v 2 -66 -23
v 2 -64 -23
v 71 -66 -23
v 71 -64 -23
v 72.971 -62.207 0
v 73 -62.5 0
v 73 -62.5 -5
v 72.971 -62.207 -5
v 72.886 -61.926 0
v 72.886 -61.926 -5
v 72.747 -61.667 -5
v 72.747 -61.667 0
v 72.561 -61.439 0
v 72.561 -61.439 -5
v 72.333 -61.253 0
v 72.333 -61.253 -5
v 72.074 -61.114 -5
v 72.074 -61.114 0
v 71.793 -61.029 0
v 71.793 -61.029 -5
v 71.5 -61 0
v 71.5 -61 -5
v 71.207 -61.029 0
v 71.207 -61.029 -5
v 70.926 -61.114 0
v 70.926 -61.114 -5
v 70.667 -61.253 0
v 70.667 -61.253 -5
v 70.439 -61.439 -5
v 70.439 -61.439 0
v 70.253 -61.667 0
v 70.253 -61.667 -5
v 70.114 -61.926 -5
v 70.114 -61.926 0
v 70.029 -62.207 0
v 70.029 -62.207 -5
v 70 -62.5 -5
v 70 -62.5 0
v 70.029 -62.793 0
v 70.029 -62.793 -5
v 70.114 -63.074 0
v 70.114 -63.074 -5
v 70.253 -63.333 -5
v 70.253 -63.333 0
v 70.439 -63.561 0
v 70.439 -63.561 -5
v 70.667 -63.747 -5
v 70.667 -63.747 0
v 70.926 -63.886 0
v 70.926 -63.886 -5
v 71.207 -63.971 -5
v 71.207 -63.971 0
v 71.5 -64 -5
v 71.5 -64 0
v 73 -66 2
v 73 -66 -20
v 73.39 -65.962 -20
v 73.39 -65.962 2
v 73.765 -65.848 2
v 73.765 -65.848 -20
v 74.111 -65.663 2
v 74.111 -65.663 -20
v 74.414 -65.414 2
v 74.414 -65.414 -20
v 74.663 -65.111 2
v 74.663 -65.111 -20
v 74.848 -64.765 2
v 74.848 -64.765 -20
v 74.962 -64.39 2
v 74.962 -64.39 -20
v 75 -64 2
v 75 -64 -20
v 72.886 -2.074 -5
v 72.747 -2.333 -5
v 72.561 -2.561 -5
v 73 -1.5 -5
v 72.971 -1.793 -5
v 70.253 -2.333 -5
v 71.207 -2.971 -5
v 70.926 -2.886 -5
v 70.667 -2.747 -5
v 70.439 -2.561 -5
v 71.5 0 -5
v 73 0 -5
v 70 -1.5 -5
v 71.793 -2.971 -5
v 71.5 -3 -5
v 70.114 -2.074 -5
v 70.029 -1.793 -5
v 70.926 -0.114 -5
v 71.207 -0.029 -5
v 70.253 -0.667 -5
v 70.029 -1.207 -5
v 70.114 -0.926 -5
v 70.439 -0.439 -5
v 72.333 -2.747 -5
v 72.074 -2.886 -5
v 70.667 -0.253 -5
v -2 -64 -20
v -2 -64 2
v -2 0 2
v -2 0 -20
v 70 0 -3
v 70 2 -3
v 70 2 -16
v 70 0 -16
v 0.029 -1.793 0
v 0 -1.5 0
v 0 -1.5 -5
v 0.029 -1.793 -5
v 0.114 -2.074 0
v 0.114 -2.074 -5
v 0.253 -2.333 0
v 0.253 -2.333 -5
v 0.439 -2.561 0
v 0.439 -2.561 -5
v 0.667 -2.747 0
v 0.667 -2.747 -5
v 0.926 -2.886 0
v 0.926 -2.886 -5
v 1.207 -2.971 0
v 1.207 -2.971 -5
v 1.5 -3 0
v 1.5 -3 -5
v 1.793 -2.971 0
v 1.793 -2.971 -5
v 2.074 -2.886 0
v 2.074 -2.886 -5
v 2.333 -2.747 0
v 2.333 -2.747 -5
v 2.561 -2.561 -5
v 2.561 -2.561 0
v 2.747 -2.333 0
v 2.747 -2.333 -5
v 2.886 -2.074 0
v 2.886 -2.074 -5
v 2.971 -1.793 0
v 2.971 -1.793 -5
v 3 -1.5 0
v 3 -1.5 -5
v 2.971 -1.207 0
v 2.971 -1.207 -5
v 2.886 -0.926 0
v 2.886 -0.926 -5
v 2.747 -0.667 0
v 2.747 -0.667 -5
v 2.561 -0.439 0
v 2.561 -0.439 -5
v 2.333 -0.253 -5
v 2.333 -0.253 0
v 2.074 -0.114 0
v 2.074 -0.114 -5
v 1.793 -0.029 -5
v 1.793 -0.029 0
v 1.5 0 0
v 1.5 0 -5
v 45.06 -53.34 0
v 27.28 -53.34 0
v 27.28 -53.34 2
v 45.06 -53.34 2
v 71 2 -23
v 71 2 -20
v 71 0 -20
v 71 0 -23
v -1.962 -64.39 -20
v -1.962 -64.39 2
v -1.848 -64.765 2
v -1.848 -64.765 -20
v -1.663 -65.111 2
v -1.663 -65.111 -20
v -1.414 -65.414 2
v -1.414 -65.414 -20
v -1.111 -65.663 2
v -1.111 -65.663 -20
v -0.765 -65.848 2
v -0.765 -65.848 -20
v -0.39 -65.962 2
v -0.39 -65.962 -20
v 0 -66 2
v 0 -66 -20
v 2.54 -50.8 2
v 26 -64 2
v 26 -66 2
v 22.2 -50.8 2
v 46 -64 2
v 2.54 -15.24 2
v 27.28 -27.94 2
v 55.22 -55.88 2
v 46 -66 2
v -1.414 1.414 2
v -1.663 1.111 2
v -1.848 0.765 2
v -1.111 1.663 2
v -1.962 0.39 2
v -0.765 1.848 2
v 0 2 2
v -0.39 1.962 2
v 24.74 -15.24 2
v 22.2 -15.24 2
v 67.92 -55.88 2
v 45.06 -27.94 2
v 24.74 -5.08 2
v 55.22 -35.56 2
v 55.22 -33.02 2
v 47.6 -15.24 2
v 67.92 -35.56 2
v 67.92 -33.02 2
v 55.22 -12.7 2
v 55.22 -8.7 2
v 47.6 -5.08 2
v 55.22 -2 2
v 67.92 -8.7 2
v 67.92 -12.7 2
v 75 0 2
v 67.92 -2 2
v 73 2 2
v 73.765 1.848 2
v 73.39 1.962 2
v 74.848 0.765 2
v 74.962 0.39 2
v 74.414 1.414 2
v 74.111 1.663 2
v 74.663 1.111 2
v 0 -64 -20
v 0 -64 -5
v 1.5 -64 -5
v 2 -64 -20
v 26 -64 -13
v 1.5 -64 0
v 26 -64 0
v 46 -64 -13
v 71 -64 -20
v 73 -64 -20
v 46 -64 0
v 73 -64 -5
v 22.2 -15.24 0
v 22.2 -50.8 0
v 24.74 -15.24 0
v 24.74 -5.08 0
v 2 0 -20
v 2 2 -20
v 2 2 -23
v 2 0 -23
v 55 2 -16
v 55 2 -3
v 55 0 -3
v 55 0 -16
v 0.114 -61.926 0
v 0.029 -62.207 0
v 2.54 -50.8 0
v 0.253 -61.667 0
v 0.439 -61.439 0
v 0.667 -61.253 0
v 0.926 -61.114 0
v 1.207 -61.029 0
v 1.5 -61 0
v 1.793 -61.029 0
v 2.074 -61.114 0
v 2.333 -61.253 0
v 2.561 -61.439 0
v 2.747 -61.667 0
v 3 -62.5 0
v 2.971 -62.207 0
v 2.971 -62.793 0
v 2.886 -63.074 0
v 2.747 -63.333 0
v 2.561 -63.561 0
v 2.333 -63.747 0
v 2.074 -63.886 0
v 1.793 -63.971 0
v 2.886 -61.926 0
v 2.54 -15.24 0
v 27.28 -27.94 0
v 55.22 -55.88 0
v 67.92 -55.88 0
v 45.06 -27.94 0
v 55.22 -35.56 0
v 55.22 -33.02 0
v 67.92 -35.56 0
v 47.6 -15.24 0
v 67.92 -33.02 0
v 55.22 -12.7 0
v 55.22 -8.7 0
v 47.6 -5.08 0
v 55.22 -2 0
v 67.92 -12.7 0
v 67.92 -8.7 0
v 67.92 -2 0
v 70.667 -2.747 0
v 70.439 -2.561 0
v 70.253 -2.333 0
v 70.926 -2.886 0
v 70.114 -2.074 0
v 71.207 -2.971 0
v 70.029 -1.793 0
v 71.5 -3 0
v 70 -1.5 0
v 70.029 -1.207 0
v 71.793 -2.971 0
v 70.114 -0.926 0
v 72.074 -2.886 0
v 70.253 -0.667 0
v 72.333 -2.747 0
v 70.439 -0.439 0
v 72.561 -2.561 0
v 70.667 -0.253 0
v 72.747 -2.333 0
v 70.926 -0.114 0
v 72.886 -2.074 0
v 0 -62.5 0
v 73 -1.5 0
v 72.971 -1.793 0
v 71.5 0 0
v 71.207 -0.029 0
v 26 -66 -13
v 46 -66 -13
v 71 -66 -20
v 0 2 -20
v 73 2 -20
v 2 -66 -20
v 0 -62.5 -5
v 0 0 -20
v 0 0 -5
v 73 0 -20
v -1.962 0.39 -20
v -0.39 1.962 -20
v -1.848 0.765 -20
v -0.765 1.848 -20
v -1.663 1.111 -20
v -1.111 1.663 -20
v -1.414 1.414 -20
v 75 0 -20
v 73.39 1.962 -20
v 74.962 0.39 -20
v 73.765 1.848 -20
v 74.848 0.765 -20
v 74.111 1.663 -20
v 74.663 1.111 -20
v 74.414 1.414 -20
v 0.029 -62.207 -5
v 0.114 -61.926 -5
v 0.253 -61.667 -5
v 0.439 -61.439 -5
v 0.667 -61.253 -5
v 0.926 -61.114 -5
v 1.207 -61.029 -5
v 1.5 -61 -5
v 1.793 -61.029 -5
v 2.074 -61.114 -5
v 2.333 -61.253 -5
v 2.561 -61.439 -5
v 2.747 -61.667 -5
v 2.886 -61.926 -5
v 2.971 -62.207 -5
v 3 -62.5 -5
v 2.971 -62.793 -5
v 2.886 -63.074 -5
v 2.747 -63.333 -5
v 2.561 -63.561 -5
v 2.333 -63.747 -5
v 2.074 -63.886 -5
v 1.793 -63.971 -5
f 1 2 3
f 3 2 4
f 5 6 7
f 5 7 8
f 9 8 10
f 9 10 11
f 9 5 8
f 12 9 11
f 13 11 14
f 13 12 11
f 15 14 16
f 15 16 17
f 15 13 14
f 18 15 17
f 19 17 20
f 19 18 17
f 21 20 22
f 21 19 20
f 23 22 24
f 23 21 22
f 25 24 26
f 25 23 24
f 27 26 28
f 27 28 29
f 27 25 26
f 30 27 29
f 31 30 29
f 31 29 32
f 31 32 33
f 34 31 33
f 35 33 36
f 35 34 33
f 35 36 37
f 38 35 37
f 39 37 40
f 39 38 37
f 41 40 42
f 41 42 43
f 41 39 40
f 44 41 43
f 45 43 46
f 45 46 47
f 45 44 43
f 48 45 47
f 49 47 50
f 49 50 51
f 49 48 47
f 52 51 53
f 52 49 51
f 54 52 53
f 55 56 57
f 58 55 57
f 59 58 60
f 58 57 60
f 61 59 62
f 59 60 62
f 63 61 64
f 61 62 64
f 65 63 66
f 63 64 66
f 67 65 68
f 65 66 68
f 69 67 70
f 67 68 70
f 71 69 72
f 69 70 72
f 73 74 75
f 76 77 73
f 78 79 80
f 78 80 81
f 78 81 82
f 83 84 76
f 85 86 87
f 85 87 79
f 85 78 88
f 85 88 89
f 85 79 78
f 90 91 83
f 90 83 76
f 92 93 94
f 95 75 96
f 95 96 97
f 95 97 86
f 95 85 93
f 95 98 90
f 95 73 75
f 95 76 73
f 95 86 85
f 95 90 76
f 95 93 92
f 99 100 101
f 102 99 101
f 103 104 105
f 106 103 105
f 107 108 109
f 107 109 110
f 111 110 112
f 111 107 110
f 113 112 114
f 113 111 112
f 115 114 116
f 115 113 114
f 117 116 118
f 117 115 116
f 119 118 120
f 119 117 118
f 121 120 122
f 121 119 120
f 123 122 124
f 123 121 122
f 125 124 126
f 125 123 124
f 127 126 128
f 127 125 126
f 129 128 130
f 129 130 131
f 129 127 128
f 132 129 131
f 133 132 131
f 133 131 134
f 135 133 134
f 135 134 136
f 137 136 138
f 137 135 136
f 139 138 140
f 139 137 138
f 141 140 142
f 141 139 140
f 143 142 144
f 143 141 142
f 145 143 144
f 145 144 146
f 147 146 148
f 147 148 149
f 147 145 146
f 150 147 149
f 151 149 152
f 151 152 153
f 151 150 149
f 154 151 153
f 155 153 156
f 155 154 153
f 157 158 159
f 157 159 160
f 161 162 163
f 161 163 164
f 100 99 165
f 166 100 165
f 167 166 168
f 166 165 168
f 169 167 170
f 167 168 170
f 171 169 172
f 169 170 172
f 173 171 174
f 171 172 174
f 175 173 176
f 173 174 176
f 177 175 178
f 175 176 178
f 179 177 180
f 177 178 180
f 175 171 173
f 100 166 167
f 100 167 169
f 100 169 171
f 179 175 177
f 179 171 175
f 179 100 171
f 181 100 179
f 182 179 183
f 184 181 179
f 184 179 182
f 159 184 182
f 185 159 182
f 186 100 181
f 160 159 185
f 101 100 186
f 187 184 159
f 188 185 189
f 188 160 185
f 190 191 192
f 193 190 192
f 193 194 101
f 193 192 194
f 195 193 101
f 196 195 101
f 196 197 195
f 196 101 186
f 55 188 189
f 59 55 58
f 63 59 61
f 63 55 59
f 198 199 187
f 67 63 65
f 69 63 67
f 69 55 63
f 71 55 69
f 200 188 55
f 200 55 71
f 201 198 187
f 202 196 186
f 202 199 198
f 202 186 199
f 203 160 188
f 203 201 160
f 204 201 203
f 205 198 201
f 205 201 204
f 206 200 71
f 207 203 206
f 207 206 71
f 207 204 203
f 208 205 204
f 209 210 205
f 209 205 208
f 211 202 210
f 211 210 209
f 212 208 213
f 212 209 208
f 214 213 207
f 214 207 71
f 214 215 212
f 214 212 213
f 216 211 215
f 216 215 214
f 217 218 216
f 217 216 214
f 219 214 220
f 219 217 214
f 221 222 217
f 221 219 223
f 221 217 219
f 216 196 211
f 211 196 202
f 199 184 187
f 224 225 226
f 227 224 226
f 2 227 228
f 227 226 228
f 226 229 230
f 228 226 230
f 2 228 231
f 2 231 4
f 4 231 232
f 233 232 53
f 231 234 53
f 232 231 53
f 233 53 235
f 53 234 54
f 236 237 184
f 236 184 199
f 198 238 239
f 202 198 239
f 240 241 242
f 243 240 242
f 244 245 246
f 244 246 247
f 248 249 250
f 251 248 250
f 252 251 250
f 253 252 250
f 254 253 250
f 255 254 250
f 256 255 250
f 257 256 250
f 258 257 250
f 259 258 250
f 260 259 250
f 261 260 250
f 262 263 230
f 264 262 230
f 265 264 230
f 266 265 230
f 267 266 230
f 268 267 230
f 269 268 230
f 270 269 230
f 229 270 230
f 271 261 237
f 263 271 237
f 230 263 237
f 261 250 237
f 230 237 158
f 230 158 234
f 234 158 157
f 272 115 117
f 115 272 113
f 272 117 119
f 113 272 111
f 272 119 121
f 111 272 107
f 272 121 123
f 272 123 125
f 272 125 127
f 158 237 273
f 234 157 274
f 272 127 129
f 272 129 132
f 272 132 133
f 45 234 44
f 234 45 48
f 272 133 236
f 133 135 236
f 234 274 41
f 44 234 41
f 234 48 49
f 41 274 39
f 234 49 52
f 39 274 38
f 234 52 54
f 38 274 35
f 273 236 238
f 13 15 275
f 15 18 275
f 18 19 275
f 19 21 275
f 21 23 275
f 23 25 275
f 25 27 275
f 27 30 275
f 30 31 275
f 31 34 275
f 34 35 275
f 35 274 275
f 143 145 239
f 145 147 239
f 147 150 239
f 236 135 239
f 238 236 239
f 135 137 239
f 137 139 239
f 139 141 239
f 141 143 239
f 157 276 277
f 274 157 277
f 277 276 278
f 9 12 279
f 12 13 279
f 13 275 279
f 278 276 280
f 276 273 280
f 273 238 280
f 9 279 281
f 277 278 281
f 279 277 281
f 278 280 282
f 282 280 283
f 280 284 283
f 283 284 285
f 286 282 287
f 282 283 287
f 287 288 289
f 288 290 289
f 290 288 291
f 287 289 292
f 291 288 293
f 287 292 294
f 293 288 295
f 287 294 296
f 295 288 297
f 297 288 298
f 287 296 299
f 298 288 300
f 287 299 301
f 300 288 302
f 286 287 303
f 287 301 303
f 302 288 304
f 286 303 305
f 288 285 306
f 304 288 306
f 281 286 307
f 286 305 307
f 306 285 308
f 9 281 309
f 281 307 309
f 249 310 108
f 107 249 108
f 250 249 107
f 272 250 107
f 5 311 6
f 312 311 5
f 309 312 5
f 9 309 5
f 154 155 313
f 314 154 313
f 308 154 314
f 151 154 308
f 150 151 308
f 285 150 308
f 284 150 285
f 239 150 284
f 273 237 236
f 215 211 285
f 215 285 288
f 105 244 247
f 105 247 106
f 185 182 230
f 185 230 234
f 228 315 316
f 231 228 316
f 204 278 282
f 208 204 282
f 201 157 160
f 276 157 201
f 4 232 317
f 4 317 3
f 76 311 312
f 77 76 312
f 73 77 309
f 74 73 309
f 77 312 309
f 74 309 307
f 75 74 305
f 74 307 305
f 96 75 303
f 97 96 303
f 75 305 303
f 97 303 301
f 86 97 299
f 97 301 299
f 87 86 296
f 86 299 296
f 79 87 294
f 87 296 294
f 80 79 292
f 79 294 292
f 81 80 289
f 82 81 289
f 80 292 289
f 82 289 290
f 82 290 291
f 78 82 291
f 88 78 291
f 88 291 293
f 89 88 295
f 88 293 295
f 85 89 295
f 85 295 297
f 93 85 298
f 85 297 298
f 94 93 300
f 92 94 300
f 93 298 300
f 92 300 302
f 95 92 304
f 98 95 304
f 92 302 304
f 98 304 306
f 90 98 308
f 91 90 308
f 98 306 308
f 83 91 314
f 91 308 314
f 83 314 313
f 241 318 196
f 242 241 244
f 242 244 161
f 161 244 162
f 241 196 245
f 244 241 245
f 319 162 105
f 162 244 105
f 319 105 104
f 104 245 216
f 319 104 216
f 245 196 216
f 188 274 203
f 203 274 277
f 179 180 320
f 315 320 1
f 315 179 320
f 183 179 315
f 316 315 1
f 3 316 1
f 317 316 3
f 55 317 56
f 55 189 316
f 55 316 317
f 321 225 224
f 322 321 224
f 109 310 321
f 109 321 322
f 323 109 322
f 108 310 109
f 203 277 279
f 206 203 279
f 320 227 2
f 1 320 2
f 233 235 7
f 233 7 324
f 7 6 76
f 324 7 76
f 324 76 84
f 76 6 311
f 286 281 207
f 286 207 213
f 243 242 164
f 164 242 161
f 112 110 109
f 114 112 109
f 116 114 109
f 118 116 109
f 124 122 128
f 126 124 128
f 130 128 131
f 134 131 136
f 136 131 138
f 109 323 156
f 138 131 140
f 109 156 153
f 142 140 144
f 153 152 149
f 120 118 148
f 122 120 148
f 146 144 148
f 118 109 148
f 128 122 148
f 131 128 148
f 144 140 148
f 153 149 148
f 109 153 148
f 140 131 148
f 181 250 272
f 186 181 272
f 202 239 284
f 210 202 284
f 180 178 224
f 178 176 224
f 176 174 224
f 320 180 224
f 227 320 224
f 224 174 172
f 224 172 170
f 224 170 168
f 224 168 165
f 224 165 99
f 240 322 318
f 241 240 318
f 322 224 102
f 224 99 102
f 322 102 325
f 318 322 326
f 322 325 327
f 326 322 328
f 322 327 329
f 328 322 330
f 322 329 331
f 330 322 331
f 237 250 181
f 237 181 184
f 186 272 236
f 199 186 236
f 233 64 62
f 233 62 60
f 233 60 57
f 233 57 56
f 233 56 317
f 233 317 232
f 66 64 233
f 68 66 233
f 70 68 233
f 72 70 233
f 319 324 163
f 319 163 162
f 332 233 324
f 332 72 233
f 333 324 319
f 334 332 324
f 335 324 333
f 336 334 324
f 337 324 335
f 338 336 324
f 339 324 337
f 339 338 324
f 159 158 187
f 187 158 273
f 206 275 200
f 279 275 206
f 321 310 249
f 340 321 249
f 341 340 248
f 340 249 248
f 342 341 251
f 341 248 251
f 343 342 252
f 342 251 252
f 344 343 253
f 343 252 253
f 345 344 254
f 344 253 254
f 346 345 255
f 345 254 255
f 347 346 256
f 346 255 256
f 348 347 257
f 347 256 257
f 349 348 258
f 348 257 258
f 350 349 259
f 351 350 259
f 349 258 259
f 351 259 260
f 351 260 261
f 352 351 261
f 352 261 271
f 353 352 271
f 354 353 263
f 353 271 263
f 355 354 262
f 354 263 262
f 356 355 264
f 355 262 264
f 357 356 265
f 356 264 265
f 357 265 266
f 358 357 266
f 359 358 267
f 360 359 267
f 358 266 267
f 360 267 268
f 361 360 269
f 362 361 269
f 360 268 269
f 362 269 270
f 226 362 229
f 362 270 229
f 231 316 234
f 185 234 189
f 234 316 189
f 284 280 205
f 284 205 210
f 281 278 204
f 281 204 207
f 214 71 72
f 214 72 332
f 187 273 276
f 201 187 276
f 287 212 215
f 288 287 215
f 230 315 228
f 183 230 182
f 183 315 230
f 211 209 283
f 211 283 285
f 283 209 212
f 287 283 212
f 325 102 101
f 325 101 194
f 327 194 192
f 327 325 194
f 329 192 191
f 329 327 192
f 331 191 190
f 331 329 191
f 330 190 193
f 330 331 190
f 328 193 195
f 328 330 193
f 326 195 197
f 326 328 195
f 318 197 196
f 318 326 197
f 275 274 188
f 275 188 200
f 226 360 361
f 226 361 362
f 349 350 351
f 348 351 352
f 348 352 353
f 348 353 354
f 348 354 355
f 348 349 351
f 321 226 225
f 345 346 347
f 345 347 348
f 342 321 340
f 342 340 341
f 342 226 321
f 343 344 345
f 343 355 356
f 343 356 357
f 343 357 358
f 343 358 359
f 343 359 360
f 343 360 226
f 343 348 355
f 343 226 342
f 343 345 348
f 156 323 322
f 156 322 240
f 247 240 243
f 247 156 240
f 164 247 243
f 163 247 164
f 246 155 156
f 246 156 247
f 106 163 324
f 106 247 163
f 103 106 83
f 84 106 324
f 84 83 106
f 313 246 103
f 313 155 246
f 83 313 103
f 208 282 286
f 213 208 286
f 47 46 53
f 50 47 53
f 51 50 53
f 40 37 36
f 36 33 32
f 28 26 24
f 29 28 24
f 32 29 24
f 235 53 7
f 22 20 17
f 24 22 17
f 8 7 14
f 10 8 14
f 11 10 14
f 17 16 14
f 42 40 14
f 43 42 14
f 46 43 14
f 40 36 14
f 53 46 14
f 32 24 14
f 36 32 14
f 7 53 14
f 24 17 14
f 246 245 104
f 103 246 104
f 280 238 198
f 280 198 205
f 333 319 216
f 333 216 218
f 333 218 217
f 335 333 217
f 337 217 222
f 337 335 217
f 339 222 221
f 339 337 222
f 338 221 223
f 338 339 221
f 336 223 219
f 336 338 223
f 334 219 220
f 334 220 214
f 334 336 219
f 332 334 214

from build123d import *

# Parameters (mm, degrees)
SKETCH_1_W               = 73
SKETCH_1_H               = 64
SKETCH_1_W_2             = 22.86
SKETCH_1_H_2             = 10.16
SKETCH_1_W_3             = 12.7
SKETCH_1_H_3             = 20.32
SKETCH_1_W_4             = 19.66
SKETCH_1_H_4             = 35.56
SKETCH_1_W_5             = 17.78
SKETCH_1_H_5             = 25.4
EXTRUDE_1_DEPTH          = 2
SKETCH_2_W               = 77
SKETCH_2_H               = 68
SKETCH_2_W_2             = 73
SKETCH_2_H_2             = 64
EXTRUDE_2_DEPTH          = 25
FILLET_1_R               = 2
SKETCH_5_W               = 3
SKETCH_5_H               = 68
CUT_EXTRUDE_1_DEPTH      = 4
CUT_EXTRUDE_2_DEPTH      = 2
CUT_EXTRUDE_2_DEPTH_BACK = 2
SKETCH_7_W               = 3
SKETCH_7_H               = 68
SKETCH_8_W               = 20
SKETCH_8_H               = 15
CUT_EXTRUDE_3_DEPTH      = 2
SKETCH_9_W               = 15
SKETCH_9_H               = 13
CUT_EXTRUDE_4_DEPTH      = 2
SKETCH_10_W              = 12.7
SKETCH_10_H              = 6.7
CUT_EXTRUDE_5_DEPTH      = 2
EXTRUDE_3_DEPTH          = 5


with BuildPart() as part:
    # 草图1 → 凸台-拉伸1 (new body)
    with BuildSketch(Plane.XY):
        with Locations((36.5, -32)):
            Rectangle(SKETCH_1_W, SKETCH_1_H)
        with Locations((36.17, -10.16)):
            Rectangle(SKETCH_1_W_2, SKETCH_1_H_2, mode=Mode.SUBTRACT)
        with Locations((61.57, -22.86)):
            Rectangle(SKETCH_1_W_3, SKETCH_1_H_3, mode=Mode.SUBTRACT)
        with Locations((61.57, -45.72)):
            Rectangle(SKETCH_1_W_3, SKETCH_1_H_3, mode=Mode.SUBTRACT)
        with Locations((12.37, -33.02)):
            Rectangle(SKETCH_1_W_4, SKETCH_1_H_4, mode=Mode.SUBTRACT)
        with Locations((36.17, -40.64)):
            Rectangle(SKETCH_1_W_5, SKETCH_1_H_5, mode=Mode.SUBTRACT)
    extrude(amount=EXTRUDE_1_DEPTH)

    # 草图2 → 凸台-拉伸2 (add)
    with BuildSketch(Plane.XY.offset(2)):
        with Locations((36.5, -32)):
            Rectangle(SKETCH_2_W, SKETCH_2_H)
        with Locations((36.5, -32)):
            Rectangle(SKETCH_2_W_2, SKETCH_2_H_2, mode=Mode.SUBTRACT)
    extrude(amount=-EXTRUDE_2_DEPTH)

    # 圆角1
    fillet_1_edges = [part.edges().sort_by_distance(p)[0] for p in [
        (-2, 2, -10.5),
        (75, 2, -10.5),
        (75, -66, -10.5),
        (-2, -66, -10.5),
    ]]
    fillet(fillet_1_edges, radius=FILLET_1_R)

    # 草图5 → 切除-拉伸1 (cut)
    with BuildSketch(Plane(origin=(75, 0, 0), x_dir=(0, 0, -1), z_dir=(1, 0, 0))):
        with Locations((21.5, -32)):
            Rectangle(SKETCH_5_W, SKETCH_5_H)
    extrude(amount=-CUT_EXTRUDE_1_DEPTH, mode=Mode.SUBTRACT)

    # 草图7 → 切除-拉伸2 (cut, two sides: drawn at the far end of the back side and taken through both)
    with BuildSketch(Plane(origin=(0, 0, 0), x_dir=(0, 0, -1), z_dir=(1, 0, 0)).offset(-CUT_EXTRUDE_2_DEPTH_BACK)):
        with Locations((21.5, -32)):
            Rectangle(SKETCH_7_W, SKETCH_7_H)
    extrude(amount=CUT_EXTRUDE_2_DEPTH + CUT_EXTRUDE_2_DEPTH_BACK, mode=Mode.SUBTRACT)

    # 草图8 → 切除-拉伸3 (cut)
    with BuildSketch(Plane.XZ.offset(66)):
        with Locations((36, -5.5)):
            Rectangle(SKETCH_8_W, SKETCH_8_H)
    extrude(amount=-CUT_EXTRUDE_3_DEPTH, mode=Mode.SUBTRACT)

    # 草图9 → 切除-拉伸4 (cut)
    with BuildSketch(Plane(origin=(0, 2, 0), x_dir=(1, 0, 0), z_dir=(0, 1, 0))):
        with Locations((62.5, 9.5)):
            Rectangle(SKETCH_9_W, SKETCH_9_H)
    extrude(amount=-CUT_EXTRUDE_4_DEPTH, mode=Mode.SUBTRACT)

    # 草图10 → 切除-拉伸5 (cut)
    with BuildSketch(Plane.XY.offset(2)):
        with Locations((61.57, -5.35)):
            Rectangle(SKETCH_10_W, SKETCH_10_H)
    extrude(amount=-CUT_EXTRUDE_5_DEPTH, mode=Mode.SUBTRACT)

    # 草图12 → 凸台-拉伸3 (add)
    with BuildSketch(Plane(origin=(0, 0, 0), x_dir=(-1, 0, 0), z_dir=(0, 0, -1))):
        with BuildLine():
            Line((-1.5, -64), (0, -64))
            Line((0, -64), (0, -62.5))
            ThreePointArc((0, -62.5), (-2.560660172, -61.439339828), (-1.5, -64))
        make_face()
        with BuildLine():
            Line((-73, -64), (-73, -62.5))
            ThreePointArc((-73, -62.5), (-70.439339828, -61.439339828), (-71.5, -64))
            Line((-71.5, -64), (-73, -64))
        make_face()
        with BuildLine():
            Line((-71.5, 0), (-73, 0))
            Line((-73, 0), (-73, -1.5))
            ThreePointArc((-73, -1.5), (-70.439339828, -2.560660172), (-71.5, 0))
        make_face()
        with BuildLine():
            Line((0, 0), (0, -1.5))
            ThreePointArc((0, -1.5), (-2.560660172, -2.560660172), (-1.5, 0))
            Line((-1.5, 0), (0, 0))
        make_face()
    extrude(amount=EXTRUDE_3_DEPTH)


solid = part.part
